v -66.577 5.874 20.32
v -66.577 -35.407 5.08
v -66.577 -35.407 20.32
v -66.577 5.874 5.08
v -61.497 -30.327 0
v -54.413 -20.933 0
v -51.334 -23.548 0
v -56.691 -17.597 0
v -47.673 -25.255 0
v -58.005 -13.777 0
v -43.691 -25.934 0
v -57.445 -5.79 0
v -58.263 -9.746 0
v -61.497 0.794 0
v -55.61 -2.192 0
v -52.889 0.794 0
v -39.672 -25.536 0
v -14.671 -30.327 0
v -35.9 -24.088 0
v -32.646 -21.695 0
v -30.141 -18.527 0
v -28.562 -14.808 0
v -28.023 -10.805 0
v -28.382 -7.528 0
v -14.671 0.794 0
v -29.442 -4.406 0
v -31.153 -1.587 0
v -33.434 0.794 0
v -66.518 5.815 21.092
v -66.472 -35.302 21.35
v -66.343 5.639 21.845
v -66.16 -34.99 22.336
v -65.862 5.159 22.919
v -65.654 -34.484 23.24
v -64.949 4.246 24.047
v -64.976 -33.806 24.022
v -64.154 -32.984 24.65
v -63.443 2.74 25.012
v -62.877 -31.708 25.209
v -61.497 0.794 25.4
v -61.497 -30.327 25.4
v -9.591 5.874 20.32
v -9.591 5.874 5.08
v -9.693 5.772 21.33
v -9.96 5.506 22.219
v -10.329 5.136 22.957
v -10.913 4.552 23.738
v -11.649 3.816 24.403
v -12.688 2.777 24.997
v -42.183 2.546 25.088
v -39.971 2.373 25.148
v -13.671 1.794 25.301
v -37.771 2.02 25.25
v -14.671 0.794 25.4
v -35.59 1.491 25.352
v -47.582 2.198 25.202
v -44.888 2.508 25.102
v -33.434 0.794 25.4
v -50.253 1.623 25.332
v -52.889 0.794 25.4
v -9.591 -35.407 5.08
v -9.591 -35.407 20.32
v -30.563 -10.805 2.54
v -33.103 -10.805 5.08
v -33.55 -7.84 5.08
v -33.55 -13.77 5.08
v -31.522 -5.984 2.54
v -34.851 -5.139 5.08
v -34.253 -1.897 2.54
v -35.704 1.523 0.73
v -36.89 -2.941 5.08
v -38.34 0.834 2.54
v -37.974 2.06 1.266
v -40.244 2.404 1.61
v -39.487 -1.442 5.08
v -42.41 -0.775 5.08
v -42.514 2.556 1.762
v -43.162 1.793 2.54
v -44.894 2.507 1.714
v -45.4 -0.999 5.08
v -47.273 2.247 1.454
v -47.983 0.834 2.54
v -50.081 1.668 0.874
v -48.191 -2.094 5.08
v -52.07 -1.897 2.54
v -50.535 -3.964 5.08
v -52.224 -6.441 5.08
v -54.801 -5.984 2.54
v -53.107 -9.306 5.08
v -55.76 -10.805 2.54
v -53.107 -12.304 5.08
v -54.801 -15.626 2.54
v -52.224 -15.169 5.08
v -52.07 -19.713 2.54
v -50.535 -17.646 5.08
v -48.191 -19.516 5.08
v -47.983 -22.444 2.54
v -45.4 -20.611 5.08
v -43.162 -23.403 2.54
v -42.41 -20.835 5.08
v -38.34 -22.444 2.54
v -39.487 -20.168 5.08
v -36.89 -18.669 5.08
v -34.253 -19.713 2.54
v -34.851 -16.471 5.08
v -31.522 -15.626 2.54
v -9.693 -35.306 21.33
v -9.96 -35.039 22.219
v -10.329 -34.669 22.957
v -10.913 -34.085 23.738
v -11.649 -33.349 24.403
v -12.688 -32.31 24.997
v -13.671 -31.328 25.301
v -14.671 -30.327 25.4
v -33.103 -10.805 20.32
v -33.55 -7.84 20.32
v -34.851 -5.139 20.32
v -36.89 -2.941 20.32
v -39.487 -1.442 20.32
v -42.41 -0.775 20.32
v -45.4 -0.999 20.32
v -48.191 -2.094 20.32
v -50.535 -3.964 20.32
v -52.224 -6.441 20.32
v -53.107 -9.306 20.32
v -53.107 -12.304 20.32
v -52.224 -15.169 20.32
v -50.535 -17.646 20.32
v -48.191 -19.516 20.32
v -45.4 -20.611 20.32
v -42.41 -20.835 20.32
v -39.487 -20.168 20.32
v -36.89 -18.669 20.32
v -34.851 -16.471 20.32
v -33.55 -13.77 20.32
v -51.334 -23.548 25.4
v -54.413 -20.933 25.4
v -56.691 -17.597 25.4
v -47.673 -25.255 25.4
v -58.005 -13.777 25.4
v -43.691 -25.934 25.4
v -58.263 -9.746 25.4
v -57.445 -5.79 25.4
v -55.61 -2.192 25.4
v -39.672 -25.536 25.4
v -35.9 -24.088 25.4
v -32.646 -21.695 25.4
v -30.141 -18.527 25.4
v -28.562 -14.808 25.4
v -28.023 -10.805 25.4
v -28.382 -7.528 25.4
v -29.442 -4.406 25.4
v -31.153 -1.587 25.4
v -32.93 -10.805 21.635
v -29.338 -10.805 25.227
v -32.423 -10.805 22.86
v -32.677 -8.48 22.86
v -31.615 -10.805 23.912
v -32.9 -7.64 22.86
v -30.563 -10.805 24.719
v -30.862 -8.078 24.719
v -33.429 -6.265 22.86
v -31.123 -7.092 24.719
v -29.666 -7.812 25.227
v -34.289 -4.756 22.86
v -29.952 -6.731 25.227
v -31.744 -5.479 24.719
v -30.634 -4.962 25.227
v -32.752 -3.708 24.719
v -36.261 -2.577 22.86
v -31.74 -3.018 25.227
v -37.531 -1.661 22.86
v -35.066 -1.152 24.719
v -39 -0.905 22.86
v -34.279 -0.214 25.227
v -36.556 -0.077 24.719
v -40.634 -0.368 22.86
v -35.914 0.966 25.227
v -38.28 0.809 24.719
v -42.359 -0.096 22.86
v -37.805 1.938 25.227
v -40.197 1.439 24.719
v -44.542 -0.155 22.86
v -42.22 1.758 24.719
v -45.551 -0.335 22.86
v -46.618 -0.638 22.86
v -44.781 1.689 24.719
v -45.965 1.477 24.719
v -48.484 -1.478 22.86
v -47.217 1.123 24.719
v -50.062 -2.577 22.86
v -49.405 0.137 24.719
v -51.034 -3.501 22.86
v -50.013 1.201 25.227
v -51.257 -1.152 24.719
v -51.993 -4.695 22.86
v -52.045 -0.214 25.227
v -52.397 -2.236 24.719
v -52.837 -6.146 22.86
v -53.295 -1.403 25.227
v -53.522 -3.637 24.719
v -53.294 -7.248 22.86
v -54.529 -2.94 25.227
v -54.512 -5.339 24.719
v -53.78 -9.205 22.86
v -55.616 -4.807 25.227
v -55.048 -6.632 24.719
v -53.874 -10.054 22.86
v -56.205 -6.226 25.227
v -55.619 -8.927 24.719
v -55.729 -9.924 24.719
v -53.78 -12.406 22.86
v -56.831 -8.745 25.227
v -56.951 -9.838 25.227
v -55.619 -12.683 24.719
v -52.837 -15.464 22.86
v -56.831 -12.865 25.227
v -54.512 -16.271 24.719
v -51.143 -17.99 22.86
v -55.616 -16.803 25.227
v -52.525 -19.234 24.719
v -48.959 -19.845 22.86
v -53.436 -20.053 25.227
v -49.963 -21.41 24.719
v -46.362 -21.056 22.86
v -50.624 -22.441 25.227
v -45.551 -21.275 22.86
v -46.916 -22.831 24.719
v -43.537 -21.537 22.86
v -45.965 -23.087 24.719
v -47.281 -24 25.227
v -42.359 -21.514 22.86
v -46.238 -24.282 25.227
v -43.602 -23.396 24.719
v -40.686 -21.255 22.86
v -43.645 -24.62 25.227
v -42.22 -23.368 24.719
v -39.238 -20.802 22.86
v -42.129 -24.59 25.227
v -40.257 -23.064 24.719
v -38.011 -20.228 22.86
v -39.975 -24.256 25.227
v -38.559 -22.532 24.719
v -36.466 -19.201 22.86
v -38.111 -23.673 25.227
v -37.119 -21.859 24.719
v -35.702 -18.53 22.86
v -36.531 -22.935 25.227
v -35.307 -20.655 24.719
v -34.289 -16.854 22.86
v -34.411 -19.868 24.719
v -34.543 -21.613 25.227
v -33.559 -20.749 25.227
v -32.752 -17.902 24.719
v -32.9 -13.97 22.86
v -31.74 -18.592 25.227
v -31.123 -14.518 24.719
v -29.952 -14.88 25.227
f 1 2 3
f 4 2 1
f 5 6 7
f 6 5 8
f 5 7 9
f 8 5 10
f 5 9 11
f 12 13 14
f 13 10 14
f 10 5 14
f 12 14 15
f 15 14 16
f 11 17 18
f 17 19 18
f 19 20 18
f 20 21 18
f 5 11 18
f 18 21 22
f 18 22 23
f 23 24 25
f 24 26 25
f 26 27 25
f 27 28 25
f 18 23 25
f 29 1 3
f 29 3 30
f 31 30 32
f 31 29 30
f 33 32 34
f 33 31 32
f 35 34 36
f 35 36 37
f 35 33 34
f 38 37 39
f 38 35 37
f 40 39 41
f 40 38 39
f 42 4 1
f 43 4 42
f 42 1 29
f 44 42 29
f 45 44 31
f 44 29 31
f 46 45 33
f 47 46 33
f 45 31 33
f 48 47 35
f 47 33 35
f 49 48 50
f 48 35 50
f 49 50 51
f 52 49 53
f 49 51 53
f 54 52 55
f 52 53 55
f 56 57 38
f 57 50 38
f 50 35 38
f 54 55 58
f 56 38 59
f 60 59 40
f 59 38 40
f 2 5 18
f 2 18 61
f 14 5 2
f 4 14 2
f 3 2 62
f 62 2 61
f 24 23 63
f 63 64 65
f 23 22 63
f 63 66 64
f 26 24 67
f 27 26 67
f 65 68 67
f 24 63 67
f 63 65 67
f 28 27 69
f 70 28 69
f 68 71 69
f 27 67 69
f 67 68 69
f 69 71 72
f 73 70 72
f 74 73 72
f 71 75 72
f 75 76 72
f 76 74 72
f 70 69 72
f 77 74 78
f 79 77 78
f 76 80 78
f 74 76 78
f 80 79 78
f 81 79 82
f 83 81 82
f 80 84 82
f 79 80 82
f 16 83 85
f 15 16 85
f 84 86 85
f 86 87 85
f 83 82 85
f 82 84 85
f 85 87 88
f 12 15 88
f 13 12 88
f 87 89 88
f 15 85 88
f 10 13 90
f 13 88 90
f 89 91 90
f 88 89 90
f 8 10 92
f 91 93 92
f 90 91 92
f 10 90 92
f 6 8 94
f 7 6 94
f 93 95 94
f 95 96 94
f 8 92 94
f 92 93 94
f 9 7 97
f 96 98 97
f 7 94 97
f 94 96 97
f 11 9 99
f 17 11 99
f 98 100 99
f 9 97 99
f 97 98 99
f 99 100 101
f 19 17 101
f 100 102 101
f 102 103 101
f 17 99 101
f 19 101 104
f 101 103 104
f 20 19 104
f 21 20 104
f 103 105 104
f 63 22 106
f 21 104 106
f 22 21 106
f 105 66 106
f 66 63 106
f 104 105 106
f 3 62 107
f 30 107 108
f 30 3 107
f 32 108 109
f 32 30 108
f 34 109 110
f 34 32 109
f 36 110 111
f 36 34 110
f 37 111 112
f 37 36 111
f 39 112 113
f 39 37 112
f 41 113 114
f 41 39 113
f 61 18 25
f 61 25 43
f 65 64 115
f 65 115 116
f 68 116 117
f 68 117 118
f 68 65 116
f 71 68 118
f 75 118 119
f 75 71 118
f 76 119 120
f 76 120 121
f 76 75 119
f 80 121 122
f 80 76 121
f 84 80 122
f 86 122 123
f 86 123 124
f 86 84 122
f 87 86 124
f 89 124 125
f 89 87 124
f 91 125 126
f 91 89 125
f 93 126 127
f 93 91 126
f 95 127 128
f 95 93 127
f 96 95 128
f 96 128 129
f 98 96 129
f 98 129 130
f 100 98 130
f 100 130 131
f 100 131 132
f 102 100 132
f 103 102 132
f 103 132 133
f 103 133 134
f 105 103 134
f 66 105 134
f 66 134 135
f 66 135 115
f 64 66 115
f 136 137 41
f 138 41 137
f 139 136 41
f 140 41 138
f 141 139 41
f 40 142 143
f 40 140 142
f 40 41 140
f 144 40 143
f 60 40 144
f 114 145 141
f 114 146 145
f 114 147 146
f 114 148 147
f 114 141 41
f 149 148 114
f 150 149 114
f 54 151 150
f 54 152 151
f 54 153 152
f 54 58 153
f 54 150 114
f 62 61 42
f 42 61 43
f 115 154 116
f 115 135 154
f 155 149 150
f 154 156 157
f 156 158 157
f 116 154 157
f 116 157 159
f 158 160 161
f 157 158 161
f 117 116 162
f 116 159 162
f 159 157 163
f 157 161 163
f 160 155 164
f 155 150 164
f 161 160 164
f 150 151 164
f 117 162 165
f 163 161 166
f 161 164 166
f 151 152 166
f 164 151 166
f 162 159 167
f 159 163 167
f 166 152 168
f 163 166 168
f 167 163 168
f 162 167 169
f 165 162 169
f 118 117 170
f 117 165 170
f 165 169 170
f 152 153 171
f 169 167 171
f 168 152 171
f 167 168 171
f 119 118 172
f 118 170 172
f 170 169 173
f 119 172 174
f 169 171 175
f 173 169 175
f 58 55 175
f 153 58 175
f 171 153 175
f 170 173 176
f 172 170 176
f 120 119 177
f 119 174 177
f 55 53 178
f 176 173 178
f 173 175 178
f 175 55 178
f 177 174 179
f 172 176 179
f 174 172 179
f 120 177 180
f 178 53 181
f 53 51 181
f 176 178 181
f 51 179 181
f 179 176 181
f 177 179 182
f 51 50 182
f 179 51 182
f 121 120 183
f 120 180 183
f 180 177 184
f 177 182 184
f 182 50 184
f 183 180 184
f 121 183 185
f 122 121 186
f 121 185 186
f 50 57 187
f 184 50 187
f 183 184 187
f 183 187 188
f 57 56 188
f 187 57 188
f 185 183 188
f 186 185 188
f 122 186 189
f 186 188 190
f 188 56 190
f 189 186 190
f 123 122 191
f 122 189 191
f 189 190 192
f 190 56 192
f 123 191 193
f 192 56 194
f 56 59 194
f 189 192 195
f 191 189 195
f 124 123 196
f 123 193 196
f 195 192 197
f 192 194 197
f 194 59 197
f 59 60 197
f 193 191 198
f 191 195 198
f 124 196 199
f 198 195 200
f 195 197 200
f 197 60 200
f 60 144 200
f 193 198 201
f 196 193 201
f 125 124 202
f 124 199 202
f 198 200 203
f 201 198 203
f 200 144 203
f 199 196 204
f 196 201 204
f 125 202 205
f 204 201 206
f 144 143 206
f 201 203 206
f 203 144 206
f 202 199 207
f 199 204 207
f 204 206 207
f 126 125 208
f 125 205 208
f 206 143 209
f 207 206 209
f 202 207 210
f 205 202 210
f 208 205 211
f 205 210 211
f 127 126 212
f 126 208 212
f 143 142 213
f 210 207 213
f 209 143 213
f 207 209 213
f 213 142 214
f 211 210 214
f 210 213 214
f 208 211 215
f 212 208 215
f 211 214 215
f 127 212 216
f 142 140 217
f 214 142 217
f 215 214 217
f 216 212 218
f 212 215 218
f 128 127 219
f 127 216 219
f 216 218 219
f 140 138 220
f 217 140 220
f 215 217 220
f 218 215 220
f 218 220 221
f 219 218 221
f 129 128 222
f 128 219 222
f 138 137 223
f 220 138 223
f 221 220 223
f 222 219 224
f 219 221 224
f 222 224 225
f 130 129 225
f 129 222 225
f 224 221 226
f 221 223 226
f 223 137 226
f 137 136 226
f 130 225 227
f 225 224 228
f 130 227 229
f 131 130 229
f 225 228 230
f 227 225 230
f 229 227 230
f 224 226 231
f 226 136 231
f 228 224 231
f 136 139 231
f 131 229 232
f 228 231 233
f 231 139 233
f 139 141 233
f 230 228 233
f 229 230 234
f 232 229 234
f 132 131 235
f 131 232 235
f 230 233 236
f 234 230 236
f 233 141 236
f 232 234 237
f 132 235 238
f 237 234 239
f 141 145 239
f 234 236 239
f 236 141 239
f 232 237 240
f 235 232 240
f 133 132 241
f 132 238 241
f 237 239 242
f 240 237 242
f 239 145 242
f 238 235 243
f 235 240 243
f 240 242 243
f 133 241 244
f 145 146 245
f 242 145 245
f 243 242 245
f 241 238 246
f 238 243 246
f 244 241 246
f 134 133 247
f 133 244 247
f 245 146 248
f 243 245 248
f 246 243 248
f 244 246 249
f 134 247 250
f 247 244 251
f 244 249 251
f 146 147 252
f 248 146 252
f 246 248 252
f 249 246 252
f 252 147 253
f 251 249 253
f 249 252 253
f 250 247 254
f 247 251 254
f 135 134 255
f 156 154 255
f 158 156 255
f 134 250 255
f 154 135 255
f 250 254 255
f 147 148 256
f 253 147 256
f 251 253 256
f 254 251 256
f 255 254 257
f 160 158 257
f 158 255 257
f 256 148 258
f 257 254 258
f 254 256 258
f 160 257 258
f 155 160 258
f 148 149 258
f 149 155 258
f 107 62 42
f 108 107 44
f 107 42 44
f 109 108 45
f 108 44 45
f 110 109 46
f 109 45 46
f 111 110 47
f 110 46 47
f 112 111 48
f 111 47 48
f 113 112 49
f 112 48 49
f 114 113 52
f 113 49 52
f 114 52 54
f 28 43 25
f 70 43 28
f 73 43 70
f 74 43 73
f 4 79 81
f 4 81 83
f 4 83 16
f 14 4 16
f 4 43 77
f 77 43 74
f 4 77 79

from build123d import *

# Parameters (mm, degrees)
F0_W        = 56.9857386872
F0_H        = 41.281120386
F0_R        = 10.0582455169
F1_DEPTH    = 25.4
F2_T1_DEPTH = 82.3857386872
F2_T3_DEPTH = 66.681120386
F3_T1_DEPTH = 83.114037845
F3_T3_DEPTH = 67.4094195437


# Not quite as in the source:
# - a fillet or chamfer that OpenCascade refuses, or shapes differently, is made with other operations: its cross-section is extruded or revolved along the edge and cut away or added


with BuildPart() as f1:
    # F0 (on Top) → F1 (new body)
    with BuildSketch(Plane.XY):
        with Locations((-38.084267173, -14.7667184938)):
            Rectangle(F0_W, F0_H)
        with Locations((-43.1615449488, -10.8050759882)):
            Circle(F0_R, mode=Mode.SUBTRACT)
    extrude(amount=F1_DEPTH)

    # F2: fillet of radius 5.08 on 5 edges, made by hand

    # F2_s2 → F2_t1 (cut)
    with BuildSketch(Plane.YZ.offset(-79.2771365166)):
        with BuildLine():
            ThreePointArc((5.8738416992, 20.32), (4.3859441476, 23.9121024484), (0.7938416992, 25.4))
            Line((0.7938416992, 25.4), (5.8738416992, 25.4))
            Line((5.8738416992, 25.4), (5.8738416992, 20.32))
        make_face()
        with BuildLine():
            ThreePointArc((-35.4072786868, 20.32), (-33.9193811352, 23.9121024484), (-30.3272786868, 25.4))
            Line((-30.3272786868, 25.4), (-35.4072786868, 25.4))
            Line((-35.4072786868, 25.4), (-35.4072786868, 20.32))
        make_face()
    extrude(amount=F2_T1_DEPTH, mode=Mode.SUBTRACT)

    # F2_s4 → F2_t3 (cut)
    with BuildSketch(Plane.XZ.offset(-18.5738416992)):
        with BuildLine():
            ThreePointArc((-66.5771365166, 20.32), (-65.089238965, 23.9121024484), (-61.4971365166, 25.4))
            Line((-61.4971365166, 25.4), (-66.5771365166, 25.4))
            Line((-66.5771365166, 25.4), (-66.5771365166, 20.32))
        make_face()
        with BuildLine():
            ThreePointArc((-9.5913978294, 20.32), (-11.0792953809, 23.9121024484), (-14.6713978294, 25.4))
            Line((-14.6713978294, 25.4), (-9.5913978294, 25.4))
            Line((-9.5913978294, 25.4), (-9.5913978294, 20.32))
        make_face()
    extrude(amount=F2_T3_DEPTH, mode=Mode.SUBTRACT)

    # F2_s5 → F2_t6 (revolve, cut)
    with BuildSketch(Plane.XZ.offset(10.8050759882)):
        with BuildLine():
            ThreePointArc((-33.103299432, 20.32), (-31.6154018804, 23.9121024484), (-28.023299432, 25.4))
            Line((-28.023299432, 25.4), (-33.103299432, 25.4))
            Line((-33.103299432, 25.4), (-33.103299432, 20.32))
        make_face()
    revolve(axis=Axis((-43.1615449488, -10.8050759882, 25.4), (0, 0, 1)), mode=Mode.SUBTRACT)

    # F3: chamfer of 5.08 on 5 edges, made by hand

    # F3_s2 → F3_t1 (cut)
    with BuildSketch(Plane.YZ.offset(-79.6412860954)):
        Polygon((5.8738416992, 5.08), (0.7938416992, 0), (5.8738416992, 0), align=None)
        Polygon((-30.3272786868, 0), (-35.4072786868, 5.08), (-35.4072786868, 0), align=None)
    extrude(amount=F3_T1_DEPTH, mode=Mode.SUBTRACT)

    # F3_s4 → F3_t3 (cut)
    with BuildSketch(Plane.XZ.offset(-18.9379912781)):
        Polygon((-61.4971365166, 0), (-66.5771365166, 5.08), (-66.5771365166, 0), align=None)
        Polygon((-14.6713978294, 0), (-9.5913978294, 5.08), (-9.5913978294, 0), align=None)
    extrude(amount=F3_T3_DEPTH, mode=Mode.SUBTRACT)

    # F3_s5 → F3_t6 (revolve, cut)
    with BuildSketch(Plane.XZ.offset(10.8050759882)):
        Polygon((-28.023299432, 0), (-33.103299432, 5.08), (-33.103299432, 0), align=None)
    revolve(axis=Axis((-43.1615449488, -10.8050759882, 0), (0, 0, 1)), mode=Mode.SUBTRACT)


solid = f1.part
